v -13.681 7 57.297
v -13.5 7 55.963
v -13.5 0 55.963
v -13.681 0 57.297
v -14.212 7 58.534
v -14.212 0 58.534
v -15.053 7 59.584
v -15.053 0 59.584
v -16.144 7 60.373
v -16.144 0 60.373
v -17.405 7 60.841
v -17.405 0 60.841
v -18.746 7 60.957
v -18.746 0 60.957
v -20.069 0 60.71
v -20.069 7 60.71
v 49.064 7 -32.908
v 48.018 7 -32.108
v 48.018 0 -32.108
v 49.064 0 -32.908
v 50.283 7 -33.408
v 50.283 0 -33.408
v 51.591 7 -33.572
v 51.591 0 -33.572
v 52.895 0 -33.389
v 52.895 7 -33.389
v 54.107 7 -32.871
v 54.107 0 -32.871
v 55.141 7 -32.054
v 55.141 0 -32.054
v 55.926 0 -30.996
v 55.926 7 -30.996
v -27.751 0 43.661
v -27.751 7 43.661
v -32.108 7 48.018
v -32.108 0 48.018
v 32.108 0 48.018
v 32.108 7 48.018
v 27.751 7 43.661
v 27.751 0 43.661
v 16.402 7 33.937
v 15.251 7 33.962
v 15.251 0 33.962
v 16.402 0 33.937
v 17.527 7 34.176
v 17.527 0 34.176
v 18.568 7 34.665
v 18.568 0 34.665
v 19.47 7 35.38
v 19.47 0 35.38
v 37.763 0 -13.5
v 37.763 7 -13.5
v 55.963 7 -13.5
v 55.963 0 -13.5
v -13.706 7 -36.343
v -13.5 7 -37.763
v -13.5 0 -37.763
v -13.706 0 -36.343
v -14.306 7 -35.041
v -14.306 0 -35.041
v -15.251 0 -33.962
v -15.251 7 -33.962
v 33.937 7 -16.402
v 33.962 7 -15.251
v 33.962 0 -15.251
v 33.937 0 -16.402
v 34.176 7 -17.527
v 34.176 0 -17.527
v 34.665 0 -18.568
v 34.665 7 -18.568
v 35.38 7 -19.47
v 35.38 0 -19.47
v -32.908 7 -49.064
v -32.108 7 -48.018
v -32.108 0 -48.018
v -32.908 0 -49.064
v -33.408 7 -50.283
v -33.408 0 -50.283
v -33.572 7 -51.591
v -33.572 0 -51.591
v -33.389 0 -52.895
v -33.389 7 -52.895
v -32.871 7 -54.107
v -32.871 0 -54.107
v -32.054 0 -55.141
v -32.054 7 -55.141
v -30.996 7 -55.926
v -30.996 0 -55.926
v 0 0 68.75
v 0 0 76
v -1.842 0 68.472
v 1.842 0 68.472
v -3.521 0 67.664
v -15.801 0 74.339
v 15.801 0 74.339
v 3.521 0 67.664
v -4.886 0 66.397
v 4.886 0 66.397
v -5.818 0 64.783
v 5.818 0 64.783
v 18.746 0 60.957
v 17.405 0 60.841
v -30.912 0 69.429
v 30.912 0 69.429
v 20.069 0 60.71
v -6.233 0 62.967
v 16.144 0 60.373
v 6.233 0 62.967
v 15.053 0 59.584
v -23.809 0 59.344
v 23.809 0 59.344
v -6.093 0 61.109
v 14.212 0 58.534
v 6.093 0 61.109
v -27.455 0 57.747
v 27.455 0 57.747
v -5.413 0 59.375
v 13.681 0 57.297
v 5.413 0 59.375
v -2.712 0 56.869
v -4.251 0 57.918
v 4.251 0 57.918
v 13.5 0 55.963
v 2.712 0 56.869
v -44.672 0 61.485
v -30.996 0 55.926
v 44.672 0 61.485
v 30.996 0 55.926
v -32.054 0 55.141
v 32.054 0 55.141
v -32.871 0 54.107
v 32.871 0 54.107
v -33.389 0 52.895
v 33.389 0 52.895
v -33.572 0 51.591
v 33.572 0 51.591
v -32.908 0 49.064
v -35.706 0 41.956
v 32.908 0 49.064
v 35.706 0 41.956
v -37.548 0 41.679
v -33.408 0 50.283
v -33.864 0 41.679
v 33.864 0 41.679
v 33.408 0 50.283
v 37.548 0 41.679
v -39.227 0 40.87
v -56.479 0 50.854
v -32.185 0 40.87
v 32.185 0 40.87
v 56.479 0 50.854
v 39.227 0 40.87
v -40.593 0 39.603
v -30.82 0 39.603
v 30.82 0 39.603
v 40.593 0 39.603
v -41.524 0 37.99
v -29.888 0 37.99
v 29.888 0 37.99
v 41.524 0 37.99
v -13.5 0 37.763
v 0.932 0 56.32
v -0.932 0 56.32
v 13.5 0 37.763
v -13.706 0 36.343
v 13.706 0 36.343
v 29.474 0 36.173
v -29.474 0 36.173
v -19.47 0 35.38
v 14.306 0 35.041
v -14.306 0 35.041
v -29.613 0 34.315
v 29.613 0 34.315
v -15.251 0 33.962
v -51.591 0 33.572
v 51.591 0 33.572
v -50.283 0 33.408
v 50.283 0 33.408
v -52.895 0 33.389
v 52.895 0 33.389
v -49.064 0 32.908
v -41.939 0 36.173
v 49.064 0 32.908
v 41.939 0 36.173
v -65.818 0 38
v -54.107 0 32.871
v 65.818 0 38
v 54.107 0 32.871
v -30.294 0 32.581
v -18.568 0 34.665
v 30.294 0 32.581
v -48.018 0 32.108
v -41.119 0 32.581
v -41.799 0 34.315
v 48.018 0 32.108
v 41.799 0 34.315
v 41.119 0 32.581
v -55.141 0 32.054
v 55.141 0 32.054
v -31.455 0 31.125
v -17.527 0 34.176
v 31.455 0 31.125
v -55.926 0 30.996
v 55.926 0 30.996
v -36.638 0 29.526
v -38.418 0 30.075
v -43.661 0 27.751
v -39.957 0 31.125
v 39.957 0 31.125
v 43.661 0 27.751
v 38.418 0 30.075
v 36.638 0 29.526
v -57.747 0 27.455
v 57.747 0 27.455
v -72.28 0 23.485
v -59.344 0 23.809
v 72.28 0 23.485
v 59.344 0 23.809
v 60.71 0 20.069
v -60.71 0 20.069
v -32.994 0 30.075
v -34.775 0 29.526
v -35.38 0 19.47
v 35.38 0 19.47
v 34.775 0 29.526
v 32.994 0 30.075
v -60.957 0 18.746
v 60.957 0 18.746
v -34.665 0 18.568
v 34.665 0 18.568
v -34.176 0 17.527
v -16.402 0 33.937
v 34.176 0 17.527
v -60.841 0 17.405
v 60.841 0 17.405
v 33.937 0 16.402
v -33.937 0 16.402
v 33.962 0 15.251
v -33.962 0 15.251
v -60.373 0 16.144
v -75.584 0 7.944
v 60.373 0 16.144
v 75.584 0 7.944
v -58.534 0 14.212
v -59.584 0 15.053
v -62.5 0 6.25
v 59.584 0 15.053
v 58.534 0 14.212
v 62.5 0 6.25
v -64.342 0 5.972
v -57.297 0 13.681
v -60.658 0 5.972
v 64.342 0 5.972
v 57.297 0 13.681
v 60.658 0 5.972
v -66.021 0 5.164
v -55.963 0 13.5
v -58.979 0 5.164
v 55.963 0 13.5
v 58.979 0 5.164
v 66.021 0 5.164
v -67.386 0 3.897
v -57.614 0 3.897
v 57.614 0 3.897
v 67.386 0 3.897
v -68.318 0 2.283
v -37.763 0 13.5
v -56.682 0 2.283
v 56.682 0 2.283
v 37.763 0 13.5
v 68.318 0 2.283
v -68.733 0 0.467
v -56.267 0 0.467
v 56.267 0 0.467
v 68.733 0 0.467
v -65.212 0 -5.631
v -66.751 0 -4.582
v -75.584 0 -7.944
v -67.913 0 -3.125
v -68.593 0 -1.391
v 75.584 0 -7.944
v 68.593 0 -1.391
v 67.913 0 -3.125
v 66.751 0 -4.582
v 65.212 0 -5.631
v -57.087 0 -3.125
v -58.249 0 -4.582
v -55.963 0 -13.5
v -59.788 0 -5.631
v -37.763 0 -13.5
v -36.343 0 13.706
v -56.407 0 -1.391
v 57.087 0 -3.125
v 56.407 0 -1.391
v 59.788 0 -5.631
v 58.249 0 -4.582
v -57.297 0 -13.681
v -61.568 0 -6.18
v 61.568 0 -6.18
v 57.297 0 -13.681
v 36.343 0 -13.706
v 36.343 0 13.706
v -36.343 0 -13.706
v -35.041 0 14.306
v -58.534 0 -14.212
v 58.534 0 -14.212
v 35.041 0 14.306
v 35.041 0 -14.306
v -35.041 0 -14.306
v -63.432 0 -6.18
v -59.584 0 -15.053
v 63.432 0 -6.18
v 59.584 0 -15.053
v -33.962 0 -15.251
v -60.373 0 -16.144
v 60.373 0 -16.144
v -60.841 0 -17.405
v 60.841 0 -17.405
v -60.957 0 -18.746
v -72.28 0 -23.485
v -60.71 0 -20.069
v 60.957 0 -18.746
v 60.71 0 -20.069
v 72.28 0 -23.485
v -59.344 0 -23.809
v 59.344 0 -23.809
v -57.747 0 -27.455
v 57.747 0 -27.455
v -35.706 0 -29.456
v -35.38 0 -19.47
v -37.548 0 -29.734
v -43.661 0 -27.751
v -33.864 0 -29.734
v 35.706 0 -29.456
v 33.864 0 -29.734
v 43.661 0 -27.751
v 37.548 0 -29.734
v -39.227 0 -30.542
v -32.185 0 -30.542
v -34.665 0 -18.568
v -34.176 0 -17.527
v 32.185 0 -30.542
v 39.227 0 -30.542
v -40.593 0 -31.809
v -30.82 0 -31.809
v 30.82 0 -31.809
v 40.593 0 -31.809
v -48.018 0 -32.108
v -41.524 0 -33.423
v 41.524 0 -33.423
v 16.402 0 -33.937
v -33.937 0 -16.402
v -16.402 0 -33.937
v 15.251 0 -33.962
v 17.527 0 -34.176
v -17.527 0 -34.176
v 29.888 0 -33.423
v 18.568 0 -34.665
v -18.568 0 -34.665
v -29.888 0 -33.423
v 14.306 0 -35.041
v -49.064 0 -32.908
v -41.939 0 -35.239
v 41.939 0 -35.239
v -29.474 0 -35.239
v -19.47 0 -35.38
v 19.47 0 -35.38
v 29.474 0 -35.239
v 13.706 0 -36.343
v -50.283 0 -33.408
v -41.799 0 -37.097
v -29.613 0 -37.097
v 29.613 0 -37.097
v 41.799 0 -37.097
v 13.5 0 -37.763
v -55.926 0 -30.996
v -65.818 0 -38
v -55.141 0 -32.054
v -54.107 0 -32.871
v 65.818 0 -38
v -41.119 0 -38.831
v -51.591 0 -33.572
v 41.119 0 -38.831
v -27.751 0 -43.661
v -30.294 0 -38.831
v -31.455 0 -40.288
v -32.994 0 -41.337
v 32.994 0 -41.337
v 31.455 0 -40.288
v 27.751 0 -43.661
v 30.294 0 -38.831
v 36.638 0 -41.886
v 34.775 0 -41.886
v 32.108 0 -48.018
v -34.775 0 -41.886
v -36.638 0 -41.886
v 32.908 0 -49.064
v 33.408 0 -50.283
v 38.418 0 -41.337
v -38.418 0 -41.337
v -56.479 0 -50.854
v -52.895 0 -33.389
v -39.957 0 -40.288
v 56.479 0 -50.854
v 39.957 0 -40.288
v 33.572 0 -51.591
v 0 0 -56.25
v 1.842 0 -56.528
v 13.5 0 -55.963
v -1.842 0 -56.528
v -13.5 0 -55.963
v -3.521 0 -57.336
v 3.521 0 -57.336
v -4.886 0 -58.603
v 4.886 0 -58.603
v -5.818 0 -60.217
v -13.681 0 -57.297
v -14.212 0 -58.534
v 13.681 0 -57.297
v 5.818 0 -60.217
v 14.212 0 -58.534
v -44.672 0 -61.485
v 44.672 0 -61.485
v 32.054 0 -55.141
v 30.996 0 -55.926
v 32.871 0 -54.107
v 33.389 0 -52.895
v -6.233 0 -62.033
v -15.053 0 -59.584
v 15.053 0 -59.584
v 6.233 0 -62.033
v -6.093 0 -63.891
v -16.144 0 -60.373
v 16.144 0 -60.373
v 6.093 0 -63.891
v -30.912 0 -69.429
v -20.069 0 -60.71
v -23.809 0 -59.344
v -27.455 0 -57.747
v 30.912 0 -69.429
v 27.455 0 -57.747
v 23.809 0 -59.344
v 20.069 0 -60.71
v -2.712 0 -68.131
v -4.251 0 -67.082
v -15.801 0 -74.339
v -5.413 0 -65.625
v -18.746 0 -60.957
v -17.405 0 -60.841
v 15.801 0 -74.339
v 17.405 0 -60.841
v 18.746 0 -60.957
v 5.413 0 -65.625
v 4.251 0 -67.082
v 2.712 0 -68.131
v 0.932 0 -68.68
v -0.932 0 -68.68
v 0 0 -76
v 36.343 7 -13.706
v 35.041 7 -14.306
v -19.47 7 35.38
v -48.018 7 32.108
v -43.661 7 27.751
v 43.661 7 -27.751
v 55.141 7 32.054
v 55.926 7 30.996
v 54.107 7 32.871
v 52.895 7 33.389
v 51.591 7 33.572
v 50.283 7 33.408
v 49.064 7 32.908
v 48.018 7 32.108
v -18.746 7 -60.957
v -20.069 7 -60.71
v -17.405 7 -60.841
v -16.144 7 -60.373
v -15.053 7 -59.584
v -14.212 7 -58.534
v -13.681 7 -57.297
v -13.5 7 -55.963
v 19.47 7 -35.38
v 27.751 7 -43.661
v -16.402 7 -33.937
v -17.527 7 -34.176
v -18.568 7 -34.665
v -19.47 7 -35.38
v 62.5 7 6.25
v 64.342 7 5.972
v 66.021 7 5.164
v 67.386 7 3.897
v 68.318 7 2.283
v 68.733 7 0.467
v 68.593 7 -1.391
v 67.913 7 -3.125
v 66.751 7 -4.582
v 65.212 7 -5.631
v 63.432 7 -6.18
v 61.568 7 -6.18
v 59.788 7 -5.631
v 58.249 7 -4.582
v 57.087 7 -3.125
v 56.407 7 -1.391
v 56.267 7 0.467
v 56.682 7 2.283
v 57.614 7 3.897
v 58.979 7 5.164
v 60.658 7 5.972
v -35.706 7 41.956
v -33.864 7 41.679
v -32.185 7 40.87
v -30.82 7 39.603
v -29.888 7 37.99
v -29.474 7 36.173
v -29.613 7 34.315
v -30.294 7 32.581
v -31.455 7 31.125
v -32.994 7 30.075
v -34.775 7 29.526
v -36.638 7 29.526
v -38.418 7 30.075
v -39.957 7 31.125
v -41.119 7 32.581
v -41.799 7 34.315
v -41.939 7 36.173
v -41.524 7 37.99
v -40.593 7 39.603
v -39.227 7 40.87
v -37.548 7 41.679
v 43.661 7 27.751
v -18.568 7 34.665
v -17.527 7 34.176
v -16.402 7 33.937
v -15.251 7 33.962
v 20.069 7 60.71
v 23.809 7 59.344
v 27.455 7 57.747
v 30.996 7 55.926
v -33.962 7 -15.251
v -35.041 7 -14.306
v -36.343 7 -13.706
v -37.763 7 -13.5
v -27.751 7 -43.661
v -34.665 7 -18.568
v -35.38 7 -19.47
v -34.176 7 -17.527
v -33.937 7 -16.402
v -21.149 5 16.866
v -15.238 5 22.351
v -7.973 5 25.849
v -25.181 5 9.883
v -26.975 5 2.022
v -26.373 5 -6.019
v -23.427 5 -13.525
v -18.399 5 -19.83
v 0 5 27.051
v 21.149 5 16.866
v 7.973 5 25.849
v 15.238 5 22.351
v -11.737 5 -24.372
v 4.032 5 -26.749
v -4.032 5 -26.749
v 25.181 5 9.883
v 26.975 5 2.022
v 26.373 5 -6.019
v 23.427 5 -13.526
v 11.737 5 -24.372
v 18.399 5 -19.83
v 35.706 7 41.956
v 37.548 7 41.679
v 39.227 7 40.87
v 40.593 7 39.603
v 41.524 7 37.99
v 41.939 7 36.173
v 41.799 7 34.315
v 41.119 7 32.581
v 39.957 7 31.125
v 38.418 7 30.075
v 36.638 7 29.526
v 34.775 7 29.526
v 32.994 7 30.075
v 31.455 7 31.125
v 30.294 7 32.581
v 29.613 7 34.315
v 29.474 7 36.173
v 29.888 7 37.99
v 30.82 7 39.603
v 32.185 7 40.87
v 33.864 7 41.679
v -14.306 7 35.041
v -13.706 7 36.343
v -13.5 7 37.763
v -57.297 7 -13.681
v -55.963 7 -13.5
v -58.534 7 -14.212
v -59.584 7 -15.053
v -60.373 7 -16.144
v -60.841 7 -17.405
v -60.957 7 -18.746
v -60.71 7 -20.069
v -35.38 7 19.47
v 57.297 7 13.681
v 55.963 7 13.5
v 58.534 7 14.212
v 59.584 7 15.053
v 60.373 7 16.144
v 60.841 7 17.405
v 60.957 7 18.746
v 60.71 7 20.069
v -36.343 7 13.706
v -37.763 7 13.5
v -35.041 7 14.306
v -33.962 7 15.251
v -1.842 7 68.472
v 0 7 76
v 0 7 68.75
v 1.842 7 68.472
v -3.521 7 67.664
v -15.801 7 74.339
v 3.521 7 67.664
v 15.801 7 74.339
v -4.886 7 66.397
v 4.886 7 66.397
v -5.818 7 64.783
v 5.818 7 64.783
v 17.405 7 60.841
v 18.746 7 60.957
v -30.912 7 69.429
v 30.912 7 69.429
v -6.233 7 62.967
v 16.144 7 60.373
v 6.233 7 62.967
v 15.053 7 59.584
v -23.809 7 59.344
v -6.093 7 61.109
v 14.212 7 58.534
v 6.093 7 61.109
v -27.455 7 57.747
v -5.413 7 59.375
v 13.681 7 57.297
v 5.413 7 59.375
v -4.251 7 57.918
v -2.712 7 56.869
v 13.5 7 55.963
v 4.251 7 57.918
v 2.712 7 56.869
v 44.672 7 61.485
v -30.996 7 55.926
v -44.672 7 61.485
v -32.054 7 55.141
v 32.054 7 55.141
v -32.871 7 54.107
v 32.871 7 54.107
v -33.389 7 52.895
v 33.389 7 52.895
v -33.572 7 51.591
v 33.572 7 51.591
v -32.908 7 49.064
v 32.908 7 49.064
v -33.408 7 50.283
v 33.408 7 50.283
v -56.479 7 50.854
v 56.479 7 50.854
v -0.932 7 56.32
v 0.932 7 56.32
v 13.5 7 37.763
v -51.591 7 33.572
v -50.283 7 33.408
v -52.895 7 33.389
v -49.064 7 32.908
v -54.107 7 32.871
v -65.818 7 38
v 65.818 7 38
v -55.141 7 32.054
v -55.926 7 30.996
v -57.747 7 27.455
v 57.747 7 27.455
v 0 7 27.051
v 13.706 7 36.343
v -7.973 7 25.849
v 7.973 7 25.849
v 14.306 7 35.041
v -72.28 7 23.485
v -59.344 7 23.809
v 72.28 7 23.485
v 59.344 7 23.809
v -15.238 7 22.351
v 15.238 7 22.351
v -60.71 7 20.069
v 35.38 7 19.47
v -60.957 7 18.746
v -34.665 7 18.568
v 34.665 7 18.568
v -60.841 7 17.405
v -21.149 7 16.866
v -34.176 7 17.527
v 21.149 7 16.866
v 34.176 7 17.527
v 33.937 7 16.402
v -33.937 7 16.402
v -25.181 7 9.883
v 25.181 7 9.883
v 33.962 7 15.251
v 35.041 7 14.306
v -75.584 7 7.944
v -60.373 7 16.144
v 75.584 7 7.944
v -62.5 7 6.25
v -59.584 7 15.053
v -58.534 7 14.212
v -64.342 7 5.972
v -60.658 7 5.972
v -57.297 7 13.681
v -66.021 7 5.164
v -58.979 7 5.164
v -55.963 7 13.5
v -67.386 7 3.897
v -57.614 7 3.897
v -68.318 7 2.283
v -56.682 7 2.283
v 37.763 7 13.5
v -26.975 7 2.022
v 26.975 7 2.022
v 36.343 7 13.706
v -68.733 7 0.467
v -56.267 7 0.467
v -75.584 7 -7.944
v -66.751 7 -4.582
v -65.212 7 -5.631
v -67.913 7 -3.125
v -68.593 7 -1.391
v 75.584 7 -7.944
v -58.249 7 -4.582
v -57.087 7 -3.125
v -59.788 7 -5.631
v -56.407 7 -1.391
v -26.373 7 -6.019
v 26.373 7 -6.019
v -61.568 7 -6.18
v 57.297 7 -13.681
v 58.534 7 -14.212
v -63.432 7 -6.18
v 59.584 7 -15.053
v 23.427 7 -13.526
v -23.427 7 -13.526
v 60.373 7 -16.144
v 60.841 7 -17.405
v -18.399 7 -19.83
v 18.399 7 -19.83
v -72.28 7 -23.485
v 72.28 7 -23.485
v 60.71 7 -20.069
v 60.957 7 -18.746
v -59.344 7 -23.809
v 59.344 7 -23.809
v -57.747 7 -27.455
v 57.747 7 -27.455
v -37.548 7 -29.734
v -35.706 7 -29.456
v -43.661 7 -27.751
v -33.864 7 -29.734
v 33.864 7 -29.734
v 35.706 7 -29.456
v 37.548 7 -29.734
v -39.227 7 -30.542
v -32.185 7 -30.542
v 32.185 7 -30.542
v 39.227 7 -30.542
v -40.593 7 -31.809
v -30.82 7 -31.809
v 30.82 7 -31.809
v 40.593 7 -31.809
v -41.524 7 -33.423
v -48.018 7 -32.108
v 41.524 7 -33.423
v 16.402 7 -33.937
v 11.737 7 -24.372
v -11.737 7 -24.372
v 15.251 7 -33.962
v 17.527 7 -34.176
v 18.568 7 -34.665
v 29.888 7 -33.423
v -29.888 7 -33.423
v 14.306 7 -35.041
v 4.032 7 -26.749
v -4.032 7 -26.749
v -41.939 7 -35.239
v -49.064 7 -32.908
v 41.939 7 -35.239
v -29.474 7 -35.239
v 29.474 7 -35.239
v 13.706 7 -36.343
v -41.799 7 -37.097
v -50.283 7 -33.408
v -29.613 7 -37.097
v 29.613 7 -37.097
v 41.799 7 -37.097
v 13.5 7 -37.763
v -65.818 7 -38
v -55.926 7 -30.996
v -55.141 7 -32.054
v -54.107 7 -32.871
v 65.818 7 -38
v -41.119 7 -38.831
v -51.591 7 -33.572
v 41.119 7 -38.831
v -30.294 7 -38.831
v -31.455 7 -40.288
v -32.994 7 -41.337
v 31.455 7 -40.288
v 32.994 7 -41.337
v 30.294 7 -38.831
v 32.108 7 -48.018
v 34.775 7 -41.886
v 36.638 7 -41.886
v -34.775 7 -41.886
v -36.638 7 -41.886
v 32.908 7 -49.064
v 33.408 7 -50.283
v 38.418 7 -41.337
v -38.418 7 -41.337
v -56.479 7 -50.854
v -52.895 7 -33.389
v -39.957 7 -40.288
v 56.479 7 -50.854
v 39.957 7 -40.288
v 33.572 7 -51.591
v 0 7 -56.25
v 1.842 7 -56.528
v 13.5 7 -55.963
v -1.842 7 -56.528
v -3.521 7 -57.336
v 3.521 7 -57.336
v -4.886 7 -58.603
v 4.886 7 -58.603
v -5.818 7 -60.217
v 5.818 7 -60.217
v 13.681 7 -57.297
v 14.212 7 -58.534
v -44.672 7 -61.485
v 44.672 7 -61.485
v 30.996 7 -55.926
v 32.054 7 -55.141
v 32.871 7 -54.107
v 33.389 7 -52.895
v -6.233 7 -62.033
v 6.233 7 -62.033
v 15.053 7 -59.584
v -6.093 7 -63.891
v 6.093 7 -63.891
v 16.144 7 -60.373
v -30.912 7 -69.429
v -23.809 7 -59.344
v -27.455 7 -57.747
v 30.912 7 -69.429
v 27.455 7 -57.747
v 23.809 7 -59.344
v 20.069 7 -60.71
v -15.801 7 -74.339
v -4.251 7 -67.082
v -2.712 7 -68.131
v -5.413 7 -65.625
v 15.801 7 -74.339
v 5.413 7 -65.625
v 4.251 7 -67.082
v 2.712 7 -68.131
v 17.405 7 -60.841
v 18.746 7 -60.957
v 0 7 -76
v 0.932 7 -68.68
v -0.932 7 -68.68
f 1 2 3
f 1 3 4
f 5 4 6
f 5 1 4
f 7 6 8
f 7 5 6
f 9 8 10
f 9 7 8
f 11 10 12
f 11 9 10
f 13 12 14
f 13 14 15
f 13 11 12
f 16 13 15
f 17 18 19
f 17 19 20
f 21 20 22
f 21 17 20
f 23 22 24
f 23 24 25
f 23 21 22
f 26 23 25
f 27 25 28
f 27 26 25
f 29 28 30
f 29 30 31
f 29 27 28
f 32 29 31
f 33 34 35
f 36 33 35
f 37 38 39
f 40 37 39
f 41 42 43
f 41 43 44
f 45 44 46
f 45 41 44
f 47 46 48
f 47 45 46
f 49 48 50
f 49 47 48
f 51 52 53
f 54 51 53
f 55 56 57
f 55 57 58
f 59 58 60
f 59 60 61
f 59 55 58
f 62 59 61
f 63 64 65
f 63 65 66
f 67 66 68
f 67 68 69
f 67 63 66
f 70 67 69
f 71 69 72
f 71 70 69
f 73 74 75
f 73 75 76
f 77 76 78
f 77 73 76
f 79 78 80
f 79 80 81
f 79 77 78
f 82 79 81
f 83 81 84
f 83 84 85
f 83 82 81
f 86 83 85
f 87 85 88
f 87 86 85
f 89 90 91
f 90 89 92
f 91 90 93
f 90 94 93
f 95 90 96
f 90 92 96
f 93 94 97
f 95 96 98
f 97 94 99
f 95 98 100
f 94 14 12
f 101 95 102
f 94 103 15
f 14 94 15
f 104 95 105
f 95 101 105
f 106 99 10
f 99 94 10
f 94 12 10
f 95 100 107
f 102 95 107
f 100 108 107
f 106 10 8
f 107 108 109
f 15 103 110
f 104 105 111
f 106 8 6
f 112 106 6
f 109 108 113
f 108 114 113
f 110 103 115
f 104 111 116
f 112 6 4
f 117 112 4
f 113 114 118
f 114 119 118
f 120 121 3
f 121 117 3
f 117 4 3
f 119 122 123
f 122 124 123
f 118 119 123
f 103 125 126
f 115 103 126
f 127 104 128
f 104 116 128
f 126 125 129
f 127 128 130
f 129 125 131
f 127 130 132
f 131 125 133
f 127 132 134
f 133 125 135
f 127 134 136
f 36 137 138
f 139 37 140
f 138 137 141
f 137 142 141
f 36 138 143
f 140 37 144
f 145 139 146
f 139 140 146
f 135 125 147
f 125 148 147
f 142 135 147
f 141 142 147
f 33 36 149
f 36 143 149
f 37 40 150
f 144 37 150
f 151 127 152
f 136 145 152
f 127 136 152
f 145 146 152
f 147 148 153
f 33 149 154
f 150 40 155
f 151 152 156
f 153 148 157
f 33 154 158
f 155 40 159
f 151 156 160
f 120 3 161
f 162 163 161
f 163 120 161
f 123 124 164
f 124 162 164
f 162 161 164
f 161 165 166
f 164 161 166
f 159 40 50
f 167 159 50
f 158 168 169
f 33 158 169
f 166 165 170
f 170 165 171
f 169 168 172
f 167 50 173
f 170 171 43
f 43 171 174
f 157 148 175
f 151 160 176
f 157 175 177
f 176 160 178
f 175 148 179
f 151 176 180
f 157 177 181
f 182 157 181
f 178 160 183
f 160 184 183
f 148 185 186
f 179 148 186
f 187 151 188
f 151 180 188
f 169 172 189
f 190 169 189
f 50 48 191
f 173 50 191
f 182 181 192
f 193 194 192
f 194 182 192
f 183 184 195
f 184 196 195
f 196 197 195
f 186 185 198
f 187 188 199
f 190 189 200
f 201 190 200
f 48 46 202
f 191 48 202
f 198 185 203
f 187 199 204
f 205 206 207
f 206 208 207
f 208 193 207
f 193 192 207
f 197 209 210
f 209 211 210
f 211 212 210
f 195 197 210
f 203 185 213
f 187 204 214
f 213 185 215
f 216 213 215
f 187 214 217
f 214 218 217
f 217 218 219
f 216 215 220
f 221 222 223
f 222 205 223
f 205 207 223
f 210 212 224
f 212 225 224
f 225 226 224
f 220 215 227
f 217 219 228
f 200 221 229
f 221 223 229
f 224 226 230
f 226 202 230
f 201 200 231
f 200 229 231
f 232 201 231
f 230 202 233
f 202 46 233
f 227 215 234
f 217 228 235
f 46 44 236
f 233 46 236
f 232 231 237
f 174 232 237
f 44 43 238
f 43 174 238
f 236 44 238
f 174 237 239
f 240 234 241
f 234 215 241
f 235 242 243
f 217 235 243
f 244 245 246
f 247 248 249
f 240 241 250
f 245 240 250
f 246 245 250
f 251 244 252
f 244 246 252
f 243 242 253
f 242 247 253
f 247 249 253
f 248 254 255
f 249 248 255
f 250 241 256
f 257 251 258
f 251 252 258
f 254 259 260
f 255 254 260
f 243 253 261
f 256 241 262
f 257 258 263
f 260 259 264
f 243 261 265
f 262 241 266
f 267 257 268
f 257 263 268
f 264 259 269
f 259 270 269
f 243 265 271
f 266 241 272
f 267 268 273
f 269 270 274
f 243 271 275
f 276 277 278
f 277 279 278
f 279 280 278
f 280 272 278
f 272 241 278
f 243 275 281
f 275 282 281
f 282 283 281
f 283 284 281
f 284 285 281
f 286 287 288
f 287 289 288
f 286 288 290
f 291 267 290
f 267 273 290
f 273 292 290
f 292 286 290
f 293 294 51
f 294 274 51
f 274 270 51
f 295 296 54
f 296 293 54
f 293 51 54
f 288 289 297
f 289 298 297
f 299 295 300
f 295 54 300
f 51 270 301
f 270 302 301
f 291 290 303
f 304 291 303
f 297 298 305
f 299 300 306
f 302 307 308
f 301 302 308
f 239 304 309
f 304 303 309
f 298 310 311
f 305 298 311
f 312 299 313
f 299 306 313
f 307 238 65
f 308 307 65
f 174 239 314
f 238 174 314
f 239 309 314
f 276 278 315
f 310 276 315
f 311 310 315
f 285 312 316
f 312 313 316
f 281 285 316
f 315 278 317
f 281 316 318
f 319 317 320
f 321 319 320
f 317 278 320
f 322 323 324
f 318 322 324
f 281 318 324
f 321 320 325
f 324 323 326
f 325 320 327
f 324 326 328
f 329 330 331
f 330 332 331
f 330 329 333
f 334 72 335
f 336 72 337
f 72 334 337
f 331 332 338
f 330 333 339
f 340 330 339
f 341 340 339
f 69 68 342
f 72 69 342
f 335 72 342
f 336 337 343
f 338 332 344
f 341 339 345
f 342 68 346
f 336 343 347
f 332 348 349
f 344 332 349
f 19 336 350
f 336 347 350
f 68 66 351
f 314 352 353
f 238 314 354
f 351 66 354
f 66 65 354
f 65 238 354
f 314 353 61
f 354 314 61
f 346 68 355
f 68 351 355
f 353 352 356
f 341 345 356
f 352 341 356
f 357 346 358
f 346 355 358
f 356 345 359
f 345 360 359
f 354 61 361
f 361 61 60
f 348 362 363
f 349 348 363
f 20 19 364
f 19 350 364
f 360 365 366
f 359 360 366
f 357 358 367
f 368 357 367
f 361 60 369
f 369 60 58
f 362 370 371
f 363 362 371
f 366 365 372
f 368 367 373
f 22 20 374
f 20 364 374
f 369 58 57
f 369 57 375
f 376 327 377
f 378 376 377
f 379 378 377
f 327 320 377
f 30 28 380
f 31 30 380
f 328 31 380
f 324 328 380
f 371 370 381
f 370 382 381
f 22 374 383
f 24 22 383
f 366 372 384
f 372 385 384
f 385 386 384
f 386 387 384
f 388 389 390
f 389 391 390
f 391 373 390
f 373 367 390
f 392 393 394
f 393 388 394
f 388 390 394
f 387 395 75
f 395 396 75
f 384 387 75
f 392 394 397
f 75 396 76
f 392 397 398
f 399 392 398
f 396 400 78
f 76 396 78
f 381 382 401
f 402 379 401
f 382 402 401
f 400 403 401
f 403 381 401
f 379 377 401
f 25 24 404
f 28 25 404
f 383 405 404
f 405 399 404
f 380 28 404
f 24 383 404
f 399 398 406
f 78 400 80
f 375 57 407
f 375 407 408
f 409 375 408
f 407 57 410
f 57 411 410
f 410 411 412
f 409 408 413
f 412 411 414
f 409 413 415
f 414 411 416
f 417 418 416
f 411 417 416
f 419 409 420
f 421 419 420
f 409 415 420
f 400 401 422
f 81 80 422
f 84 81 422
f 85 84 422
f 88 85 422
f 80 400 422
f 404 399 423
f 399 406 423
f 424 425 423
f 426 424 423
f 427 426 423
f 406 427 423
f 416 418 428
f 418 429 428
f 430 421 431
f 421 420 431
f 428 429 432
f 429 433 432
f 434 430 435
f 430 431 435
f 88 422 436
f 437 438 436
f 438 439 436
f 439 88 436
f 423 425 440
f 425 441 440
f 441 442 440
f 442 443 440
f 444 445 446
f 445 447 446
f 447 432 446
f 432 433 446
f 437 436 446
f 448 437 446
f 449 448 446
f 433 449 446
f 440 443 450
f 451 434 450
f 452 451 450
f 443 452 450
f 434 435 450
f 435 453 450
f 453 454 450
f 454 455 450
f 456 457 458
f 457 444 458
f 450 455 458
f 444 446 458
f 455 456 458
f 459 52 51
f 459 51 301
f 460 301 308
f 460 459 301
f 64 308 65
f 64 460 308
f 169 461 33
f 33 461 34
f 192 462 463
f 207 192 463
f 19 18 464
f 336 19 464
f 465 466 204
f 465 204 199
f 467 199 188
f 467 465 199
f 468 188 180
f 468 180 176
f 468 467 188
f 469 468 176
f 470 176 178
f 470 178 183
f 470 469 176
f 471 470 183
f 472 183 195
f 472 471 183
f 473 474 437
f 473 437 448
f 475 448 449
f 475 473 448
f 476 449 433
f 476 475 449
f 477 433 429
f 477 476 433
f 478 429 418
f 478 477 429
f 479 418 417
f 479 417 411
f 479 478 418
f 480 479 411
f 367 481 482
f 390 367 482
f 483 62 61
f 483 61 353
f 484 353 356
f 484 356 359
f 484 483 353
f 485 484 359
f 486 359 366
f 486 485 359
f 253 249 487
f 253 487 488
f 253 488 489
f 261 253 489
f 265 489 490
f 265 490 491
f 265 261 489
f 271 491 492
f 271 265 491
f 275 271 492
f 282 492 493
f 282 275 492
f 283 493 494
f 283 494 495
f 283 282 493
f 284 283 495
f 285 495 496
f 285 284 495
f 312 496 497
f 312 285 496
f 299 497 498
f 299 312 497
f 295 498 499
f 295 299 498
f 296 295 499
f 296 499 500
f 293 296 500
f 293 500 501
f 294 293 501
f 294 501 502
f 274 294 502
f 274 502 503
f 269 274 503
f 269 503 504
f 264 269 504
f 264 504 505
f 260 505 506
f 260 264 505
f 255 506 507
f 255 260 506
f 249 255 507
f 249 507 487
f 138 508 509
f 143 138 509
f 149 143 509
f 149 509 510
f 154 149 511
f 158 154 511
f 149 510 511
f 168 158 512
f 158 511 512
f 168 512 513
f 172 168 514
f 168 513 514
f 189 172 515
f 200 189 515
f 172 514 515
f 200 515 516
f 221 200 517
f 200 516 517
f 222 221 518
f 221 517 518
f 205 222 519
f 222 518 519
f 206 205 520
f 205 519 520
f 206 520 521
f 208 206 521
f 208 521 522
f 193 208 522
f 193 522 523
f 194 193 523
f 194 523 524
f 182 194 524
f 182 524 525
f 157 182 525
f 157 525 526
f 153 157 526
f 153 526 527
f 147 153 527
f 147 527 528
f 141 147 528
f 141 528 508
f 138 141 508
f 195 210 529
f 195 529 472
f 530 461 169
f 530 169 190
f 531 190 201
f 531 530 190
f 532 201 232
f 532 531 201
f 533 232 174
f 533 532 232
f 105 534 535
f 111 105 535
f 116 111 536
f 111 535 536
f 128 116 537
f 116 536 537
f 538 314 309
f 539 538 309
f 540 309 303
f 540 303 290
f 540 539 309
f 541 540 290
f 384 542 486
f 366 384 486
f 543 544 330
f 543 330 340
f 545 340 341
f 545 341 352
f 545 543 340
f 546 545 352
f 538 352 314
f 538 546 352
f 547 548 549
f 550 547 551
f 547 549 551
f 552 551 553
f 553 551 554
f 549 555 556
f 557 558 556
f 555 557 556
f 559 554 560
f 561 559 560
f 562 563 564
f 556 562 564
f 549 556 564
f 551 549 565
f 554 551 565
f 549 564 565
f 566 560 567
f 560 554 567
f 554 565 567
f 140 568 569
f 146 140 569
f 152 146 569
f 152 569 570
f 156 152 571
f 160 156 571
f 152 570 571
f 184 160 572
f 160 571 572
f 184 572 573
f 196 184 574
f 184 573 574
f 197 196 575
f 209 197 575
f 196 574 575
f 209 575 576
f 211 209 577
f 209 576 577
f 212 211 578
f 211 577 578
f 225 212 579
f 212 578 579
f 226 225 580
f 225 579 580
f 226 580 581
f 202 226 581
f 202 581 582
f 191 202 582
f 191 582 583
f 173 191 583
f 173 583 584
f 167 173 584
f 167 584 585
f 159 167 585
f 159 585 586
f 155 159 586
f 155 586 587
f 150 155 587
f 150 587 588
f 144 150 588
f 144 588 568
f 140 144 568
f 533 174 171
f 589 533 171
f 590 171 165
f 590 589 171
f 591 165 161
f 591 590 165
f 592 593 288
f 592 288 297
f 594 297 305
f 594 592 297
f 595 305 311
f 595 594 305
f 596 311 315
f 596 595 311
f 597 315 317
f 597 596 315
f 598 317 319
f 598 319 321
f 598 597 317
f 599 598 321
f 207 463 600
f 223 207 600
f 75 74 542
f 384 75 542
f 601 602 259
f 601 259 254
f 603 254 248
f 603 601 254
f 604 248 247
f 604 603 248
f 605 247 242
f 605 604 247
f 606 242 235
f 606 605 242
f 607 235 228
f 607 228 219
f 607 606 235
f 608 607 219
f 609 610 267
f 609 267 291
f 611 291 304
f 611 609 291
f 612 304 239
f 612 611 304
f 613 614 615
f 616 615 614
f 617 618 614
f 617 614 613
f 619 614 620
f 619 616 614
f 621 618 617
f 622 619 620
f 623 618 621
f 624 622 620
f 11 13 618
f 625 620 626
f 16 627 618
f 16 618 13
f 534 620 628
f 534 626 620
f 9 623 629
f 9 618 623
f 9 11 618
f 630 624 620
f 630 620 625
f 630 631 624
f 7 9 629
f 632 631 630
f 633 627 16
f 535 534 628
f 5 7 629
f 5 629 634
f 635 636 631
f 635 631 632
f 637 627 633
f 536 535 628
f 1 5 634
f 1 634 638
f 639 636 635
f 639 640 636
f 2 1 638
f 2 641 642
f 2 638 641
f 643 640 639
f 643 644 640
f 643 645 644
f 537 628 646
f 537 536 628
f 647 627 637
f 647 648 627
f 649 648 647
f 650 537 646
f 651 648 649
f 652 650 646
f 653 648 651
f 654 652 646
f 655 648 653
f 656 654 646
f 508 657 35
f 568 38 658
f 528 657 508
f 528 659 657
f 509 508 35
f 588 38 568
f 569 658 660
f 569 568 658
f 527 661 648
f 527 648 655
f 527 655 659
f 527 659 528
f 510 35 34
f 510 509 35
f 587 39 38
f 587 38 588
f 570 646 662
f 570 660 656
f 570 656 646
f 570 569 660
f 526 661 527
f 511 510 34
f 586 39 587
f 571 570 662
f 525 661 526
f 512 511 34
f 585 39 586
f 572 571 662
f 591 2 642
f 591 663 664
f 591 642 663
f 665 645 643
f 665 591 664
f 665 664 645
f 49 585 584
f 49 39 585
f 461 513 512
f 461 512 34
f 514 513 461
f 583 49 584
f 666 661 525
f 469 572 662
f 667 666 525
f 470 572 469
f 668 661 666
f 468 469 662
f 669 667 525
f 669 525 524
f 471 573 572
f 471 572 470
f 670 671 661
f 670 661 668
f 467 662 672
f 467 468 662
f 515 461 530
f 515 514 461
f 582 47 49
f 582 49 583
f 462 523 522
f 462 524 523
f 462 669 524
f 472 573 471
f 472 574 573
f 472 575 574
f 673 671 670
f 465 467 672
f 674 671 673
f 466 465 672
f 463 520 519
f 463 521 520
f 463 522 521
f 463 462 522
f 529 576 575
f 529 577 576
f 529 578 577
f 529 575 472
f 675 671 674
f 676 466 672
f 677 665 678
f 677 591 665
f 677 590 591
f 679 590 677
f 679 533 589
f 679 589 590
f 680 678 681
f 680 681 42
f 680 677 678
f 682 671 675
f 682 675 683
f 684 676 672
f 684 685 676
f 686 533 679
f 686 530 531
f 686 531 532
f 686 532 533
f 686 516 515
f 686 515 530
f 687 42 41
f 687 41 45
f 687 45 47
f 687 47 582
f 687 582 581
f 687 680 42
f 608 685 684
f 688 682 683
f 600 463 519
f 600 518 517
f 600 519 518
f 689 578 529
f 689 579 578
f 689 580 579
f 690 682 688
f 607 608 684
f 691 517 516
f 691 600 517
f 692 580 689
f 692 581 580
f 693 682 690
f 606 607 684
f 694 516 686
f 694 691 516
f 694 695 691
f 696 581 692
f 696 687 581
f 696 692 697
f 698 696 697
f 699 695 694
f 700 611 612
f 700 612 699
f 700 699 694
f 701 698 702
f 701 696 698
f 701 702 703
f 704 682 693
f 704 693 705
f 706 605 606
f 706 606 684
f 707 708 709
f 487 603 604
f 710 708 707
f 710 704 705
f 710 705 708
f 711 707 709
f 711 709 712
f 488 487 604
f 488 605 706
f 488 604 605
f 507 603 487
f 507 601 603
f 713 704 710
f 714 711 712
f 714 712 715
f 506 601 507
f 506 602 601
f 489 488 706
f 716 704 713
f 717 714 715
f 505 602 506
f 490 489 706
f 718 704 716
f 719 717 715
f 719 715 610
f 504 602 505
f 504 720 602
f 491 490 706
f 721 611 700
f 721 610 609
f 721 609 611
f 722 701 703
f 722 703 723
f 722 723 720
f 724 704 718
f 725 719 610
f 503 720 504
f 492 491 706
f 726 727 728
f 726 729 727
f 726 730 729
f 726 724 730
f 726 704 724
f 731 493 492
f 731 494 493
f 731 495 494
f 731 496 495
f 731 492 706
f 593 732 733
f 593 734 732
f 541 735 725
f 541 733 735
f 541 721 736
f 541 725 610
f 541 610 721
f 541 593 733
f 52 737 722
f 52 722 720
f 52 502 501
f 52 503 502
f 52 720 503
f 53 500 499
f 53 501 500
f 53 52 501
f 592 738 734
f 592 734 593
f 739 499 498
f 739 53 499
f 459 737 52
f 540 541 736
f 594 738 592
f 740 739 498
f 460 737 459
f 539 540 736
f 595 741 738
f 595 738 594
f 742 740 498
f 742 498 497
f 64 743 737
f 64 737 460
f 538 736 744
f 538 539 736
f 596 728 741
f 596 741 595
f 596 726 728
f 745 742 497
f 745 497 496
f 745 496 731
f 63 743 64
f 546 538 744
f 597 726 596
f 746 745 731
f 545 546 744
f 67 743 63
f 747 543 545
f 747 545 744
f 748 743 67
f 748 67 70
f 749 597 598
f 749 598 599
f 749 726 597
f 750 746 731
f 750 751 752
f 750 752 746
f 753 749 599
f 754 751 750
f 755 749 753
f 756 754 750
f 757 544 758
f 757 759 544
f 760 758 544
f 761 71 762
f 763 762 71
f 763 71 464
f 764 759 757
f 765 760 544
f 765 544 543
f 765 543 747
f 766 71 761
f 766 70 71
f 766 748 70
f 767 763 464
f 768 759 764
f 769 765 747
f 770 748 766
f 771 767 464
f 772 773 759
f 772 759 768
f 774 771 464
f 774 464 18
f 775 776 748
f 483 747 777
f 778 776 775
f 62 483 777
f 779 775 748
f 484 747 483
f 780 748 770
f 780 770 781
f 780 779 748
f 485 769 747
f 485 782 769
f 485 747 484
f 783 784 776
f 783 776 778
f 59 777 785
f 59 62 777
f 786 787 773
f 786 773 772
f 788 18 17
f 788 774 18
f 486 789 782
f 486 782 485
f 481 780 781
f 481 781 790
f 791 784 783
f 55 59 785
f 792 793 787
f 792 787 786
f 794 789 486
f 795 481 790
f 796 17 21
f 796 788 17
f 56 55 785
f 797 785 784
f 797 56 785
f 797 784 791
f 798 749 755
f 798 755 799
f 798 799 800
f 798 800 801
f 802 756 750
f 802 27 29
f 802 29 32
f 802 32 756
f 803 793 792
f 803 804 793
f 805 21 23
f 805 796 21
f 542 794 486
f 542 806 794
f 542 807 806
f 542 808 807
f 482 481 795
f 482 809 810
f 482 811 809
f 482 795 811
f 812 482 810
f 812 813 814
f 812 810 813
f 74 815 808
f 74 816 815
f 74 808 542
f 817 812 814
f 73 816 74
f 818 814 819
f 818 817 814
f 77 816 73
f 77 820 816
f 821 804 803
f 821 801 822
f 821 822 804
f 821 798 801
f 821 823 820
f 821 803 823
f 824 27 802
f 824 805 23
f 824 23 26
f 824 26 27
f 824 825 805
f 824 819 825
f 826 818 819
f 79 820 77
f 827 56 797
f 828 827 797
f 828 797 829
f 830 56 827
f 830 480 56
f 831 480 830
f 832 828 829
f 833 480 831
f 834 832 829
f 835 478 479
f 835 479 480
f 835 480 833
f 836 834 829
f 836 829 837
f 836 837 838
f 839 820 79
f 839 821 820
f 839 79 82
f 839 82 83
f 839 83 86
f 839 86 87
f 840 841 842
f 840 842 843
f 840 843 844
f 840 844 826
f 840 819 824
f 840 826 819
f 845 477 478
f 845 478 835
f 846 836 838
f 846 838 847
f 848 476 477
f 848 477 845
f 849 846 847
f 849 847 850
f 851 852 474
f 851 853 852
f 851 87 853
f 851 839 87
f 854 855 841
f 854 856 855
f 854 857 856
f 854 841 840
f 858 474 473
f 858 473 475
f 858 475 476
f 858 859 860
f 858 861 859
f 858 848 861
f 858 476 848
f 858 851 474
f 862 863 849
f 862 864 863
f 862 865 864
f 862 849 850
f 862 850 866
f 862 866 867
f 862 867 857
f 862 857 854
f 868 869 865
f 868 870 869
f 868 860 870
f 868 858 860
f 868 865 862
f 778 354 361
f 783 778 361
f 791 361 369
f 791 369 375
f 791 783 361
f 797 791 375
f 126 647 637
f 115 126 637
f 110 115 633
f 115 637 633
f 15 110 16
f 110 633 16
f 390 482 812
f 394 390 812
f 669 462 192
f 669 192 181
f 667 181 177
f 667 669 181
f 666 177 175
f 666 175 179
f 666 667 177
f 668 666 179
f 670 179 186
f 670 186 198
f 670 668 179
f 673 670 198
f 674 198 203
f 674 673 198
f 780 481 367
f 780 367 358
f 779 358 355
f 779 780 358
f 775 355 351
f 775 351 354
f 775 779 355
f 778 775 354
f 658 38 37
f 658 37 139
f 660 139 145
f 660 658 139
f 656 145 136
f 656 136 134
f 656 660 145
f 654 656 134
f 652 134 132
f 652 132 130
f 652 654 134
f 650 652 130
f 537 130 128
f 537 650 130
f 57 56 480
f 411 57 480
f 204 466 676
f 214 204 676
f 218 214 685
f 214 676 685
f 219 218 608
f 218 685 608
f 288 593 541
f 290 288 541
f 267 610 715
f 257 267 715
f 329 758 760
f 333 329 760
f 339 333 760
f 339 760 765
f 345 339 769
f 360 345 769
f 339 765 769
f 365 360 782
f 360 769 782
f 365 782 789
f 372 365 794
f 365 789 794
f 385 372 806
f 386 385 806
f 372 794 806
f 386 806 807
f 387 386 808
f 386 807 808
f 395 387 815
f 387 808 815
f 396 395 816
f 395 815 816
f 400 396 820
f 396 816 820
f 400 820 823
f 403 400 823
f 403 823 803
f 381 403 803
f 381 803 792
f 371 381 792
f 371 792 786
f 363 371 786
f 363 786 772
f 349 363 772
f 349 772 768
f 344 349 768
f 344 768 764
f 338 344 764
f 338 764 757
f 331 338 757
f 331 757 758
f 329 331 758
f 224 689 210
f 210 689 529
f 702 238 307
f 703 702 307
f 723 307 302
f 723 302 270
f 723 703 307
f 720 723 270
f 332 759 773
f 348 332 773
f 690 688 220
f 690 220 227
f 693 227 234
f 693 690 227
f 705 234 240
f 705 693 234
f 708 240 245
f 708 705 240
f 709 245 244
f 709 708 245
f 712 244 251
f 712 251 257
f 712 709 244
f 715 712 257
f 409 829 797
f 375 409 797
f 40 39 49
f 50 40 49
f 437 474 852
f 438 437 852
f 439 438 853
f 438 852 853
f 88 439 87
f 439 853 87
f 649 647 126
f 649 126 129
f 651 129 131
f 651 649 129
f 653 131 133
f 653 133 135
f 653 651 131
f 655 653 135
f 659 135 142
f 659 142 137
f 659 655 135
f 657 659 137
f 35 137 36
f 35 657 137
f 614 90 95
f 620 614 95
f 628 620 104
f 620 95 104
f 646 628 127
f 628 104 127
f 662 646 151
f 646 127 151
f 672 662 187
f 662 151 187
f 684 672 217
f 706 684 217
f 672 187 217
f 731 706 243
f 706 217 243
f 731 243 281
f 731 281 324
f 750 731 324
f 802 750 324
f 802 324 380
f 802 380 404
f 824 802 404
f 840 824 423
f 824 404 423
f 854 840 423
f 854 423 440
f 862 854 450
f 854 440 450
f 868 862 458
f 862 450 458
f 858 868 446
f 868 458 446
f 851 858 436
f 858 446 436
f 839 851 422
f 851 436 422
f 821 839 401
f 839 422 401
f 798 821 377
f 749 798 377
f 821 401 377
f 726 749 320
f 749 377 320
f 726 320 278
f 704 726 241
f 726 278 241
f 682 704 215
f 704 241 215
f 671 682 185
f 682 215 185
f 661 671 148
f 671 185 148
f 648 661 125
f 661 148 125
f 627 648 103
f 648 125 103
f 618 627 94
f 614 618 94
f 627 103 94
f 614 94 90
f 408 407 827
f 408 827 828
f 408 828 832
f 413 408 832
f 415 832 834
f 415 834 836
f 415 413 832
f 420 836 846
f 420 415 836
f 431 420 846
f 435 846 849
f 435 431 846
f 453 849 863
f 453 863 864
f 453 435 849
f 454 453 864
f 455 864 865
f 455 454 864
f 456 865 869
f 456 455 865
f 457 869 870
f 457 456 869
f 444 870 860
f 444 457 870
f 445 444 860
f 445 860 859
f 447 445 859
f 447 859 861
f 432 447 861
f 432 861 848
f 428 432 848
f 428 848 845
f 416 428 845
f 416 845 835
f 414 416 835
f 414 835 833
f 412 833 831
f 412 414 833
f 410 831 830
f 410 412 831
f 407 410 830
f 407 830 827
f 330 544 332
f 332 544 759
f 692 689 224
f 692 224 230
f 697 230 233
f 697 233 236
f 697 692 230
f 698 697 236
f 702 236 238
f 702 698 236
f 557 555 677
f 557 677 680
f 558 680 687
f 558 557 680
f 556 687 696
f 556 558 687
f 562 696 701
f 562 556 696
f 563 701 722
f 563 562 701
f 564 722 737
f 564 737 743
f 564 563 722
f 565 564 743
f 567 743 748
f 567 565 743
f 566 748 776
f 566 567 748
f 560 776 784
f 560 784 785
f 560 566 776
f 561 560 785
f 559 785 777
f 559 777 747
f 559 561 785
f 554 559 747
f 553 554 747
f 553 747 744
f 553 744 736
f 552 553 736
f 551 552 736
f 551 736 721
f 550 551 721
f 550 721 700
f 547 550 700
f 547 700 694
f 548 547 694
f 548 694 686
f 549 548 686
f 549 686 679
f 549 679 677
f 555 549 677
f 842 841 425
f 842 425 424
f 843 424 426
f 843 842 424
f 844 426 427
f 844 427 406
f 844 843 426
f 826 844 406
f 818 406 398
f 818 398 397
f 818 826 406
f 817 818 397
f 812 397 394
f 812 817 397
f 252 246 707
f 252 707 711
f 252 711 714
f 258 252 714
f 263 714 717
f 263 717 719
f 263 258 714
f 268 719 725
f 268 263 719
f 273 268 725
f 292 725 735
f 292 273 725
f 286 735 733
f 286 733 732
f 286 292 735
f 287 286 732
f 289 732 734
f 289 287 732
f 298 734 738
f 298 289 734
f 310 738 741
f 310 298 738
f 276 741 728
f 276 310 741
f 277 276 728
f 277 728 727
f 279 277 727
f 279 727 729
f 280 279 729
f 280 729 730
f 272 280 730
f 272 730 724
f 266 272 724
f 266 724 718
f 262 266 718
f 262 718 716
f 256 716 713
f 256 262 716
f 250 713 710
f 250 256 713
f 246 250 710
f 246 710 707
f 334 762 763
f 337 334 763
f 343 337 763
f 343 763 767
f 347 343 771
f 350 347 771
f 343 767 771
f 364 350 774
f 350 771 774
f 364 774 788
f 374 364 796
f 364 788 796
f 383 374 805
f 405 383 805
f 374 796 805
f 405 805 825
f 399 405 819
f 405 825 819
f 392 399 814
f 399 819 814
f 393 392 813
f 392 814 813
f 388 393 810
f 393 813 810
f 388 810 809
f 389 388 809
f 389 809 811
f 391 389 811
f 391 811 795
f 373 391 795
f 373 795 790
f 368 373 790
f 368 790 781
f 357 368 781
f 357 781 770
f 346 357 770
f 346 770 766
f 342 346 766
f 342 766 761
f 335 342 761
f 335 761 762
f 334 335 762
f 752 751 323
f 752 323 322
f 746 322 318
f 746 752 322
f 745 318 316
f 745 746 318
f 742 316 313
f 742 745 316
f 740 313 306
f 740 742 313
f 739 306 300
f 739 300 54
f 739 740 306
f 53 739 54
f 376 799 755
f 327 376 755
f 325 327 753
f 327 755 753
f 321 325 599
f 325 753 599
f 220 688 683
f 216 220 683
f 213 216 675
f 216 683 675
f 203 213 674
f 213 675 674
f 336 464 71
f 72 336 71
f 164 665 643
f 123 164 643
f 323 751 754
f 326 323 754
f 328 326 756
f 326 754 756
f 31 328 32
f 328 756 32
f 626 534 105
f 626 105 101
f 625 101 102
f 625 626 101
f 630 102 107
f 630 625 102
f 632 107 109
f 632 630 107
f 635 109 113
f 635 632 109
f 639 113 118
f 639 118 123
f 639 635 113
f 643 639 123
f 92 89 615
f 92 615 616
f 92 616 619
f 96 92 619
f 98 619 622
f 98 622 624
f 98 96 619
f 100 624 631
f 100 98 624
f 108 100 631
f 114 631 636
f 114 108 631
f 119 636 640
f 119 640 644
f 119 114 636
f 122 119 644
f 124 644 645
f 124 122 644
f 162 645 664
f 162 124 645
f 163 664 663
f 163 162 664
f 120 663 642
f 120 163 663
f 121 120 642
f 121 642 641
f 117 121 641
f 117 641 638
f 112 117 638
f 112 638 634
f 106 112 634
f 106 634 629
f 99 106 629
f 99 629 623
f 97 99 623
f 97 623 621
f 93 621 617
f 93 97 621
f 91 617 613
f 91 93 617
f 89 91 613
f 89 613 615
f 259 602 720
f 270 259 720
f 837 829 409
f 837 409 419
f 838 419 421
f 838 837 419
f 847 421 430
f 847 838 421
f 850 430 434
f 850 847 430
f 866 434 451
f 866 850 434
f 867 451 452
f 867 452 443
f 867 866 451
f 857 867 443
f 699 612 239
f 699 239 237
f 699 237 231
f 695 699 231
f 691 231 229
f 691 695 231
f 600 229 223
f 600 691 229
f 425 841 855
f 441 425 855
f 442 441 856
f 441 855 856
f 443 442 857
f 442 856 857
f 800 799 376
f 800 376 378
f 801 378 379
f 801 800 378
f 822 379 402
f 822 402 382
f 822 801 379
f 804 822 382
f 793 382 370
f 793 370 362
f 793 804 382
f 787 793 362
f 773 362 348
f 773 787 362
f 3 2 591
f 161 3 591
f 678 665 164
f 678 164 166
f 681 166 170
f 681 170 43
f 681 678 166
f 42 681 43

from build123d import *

# Parameters (mm, degrees)
SKETCH1_R           = 76
SKETCH1_R_2         = 27.051
SKETCH1_R_3         = 6.25
BOSS_EXTRUDE1_DEPTH = 7
SKETCH3_R           = 27.051
BOSS_EXTRUDE2_DEPTH = 5
SKETCH4_R           = 6.25
CUT_EXTRUDE1_DEPTH  = 10
FILLET1_R           = 5


with BuildPart() as part:
    # Sketch1 → Boss-Extrude1 (new body)
    with BuildSketch(Plane(origin=(0, 0, 0), x_dir=(1, 0, 0), z_dir=(0, 1, 0))):
        with Locations(Location((0, 0, 0), (0, 0, 270))):
            Circle(SKETCH1_R)
        with Locations(Location((0, 0, 0), (0, 0, 270))):
            Circle(SKETCH1_R_2, mode=Mode.SUBTRACT)
        with Locations(Location((0, 62.5, 0), (0, 0, 270))):
            Circle(SKETCH1_R_3, mode=Mode.SUBTRACT)
        with Locations(Location((62.5, 0, 0), (0, 0, 270))):
            Circle(SKETCH1_R_3, mode=Mode.SUBTRACT)
        with Locations(Location((0, -62.5, 0), (0, 0, 270))):
            Circle(SKETCH1_R_3, mode=Mode.SUBTRACT)
        with Locations(Location((-62.5, 0, 0), (0, 0, 270))):
            Circle(SKETCH1_R_3, mode=Mode.SUBTRACT)
    extrude(amount=BOSS_EXTRUDE1_DEPTH)

    # Sketch3 → Boss-Extrude2 (add)
    with BuildSketch(Plane.XZ):
        with Locations(Location((0, 0, 0), (0, 0, 270))):
            Circle(SKETCH3_R)
    extrude(amount=-BOSS_EXTRUDE2_DEPTH)

    # Sketch4 → Cut-Extrude1 (cut)
    with BuildSketch(Plane(origin=(0, 7, 0), x_dir=(1, 0, 0), z_dir=(0, 1, 0))):
        with BuildLine():
            Line((27.751246841, -43.661149418), (17.007161012, -32.917063589))
            ThreePointArc((17.007161012, -32.917063589), (15.274204293, -33.756114768), (13.5, -34.504008477))
            Line((13.5, -34.504008477), (13.5, -62.5))
            ThreePointArc((13.5, -62.5), (25.524772494, -58.625813335), (36.553123822, -52.463026398))
            Line((36.553123822, -52.463026398), (27.751246841, -43.661149418))
        make_face()
        with BuildLine():
            Line((62.5, -13.5), (34.504008477, -13.5))
            ThreePointArc((34.504008477, -13.5), (33.756114768, -15.274204293), (32.917063589, -17.007161012))
            Line((32.917063589, -17.007161012), (43.66114941, -27.751246833))
            Line((43.66114941, -27.751246833), (52.463026398, -36.553123822))
            ThreePointArc((52.463026398, -36.553123822), (58.625813335, -25.524772494), (62.5, -13.5))
        make_face()
        with BuildLine():
            ThreePointArc((-13.5, -34.504008477), (-15.274204293, -33.756114768), (-17.007161012, -32.917063589))
            Line((-17.007161012, -32.917063589), (-27.751246874, -43.66114945))
            Line((-27.751246874, -43.66114945), (-36.553123822, -52.463026398))
            ThreePointArc((-36.553123822, -52.463026398), (-25.524772494, -58.625813335), (-13.5, -62.5))
            Line((-13.5, -62.5), (-13.5, -34.504008477))
        make_face()
        with BuildLine():
            ThreePointArc((-32.917063589, -17.007161012), (-33.756114768, -15.274204293), (-34.504008477, -13.5))
            Line((-34.504008477, -13.5), (-62.5, -13.5))
            ThreePointArc((-62.5, -13.5), (-58.625813335, -25.524772494), (-52.463026398, -36.553123822))
            Line((-52.463026398, -36.553123822), (-43.661149471, -27.751246894))
            Line((-43.661149471, -27.751246894), (-32.917063589, -17.007161012))
        make_face()
        with BuildLine():
            ThreePointArc((-34.504008477, 13.5), (-33.756114768, 15.274204293), (-32.917063589, 17.007161012))
            Line((-32.917063589, 17.007161012), (-43.66114943, 27.751246854))
            Line((-43.66114943, 27.751246854), (-52.463026398, 36.553123822))
            ThreePointArc((-52.463026398, 36.553123822), (-58.625813335, 25.524772494), (-62.5, 13.5))
            Line((-62.5, 13.5), (-34.504008477, 13.5))
        make_face()
        with BuildLine():
            ThreePointArc((-17.007161012, 32.917063589), (-15.274204293, 33.756114768), (-13.5, 34.504008477))
            Line((-13.5, 34.504008477), (-13.5, 62.5))
            ThreePointArc((-13.5, 62.5), (-25.524772494, 58.625813335), (-36.553123822, 52.463026398))
            Line((-36.553123822, 52.463026398), (-27.751246874, 43.66114945))
            Line((-27.751246874, 43.66114945), (-17.007161012, 32.917063589))
        make_face()
        with BuildLine():
            ThreePointArc((36.553123822, 52.463026398), (25.524772494, 58.625813335), (13.5, 62.5))
            Line((13.5, 62.5), (13.5, 34.504008477))
            ThreePointArc((13.5, 34.504008477), (15.274204293, 33.756114768), (17.007161012, 32.917063589))
            Line((17.007161012, 32.917063589), (27.751246906, 43.661149483))
            Line((27.751246906, 43.661149483), (36.553123822, 52.463026398))
        make_face()
        with BuildLine():
            ThreePointArc((62.5, 13.5), (58.625813335, 25.524772494), (52.463026398, 36.553123822))
            Line((52.463026398, 36.553123822), (43.66114945, 27.751246874))
            Line((43.66114945, 27.751246874), (32.917063589, 17.007161012))
            ThreePointArc((32.917063589, 17.007161012), (33.756114768, 15.274204293), (34.504008477, 13.5))
            Line((34.504008477, 13.5), (62.5, 13.5))
        make_face()
        with Locations(Location((35.706198162, 35.706198162, 0), (0, 0, 270))):
            Circle(SKETCH4_R)
        with Locations(Location((35.706198162, -35.706198162, 0), (0, 0, 270))):
            Circle(SKETCH4_R)
        with Locations(Location((-35.706198162, -35.706198162, 0), (0, 0, 270))):
            Circle(SKETCH4_R)
        with Locations(Location((-35.706198162, 35.706198162, 0), (0, 0, 270))):
            Circle(SKETCH4_R)
    extrude(amount=-CUT_EXTRUDE1_DEPTH, mode=Mode.SUBTRACT)

    # Fillet1
    # the kernel refuses this fillet: 5 mm, written as the material it adds along each edge
    with BuildSketch(Plane(origin=(34.504008477, 7, 13.5), x_dir=(1, 0, 0), z_dir=(0, -1, 0)), Plane(origin=(13.5, 7, -34.504008477), x_dir=(0, 0, -1), z_dir=(0, -1, 0)), Plane(origin=(-34.504008477, 7, -13.5), x_dir=(-1, 0, 0), z_dir=(0, -1, 0)), Plane(origin=(-13.5, 7, 34.504008477), x_dir=(0, 0, 1), z_dir=(0, -1, 0))) as fillet1_piece_1:
        with BuildLine():
            CenterArc((3.258891319, 5), FILLET1_R, 206.100178987, 63.899821013)
            ThreePointArc((-1.231239688, 2.800290124), (-0.586707725, 1.412857227), (0, 0))
            Line((0, 0), (3.258891319, 0))
        make_face()
    extrude(amount=7)
    with BuildSketch(Plane(origin=(62.5, 7, 13.5), x_dir=(-1, 0, 0), z_dir=(0, -1, 0))) as fillet1_piece_2:
        with BuildLine():
            CenterArc((6.537189081, -5), FILLET1_R, 90, 108.2926811)
            ThreePointArc((1.789861186, -6.569355874), (0.807426008, -3.308519097), (0, 0))
            Line((0, 0), (6.537189081, 0))
        make_face()
    extrude(amount=7)
    with BuildSketch(Plane(origin=(52.463026398, 7, 36.553123822), x_dir=(-0.7071067811865521, 0, -0.707106781186543), z_dir=(0, -1, 0)), Plane(origin=(-36.553123822, 7, 52.463026398), x_dir=(0.7071067811865515, 0, -0.7071067811865436), z_dir=(0, -1, 0))) as fillet1_piece_3:
        with BuildLine():
            CenterArc((6.286852353, 5), FILLET1_R, 163.996405934, 106.003594066)
            ThreePointArc((1.480630334, 6.378488268), (0.658610883, 3.208210045), (0, 0))
            Line((0, 0), (6.286852353, 0))
        make_face()
    extrude(amount=7)
    with BuildSketch(Plane(origin=(32.917063589, 7, 17.007161012), x_dir=(0.4193809358930841, 0, -0.907810349472532), z_dir=(0, -1, 0)), Plane(origin=(17.007161012, 7, -32.917063589), x_dir=(-0.9078103494725283, 0, -0.41938093589309267), z_dir=(0, -1, 0)), Plane(origin=(-32.917063589, 7, -17.007161012), x_dir=(-0.4193809358930852, 0, 0.9078103494725317), z_dir=(0, -1, 0))) as fillet1_piece_4:
        with BuildLine():
            CenterArc((3.489548398, 4.995132399), FILLET1_R, 200.204490443, 67.267112024)
            Line((-1.202781391, 3.268273647), (0, 0))
            ThreePointArc((0, 0), (1.634487847, 0.036069898), (3.268975694, 0))
        make_face()
    extrude(amount=7)
    with BuildSketch(Plane(origin=(32.917063589, 7, -17.007161012), x_dir=(0.7071067811865526, 0, -0.7071067811865425), z_dir=(0, -1, 0)), Plane(origin=(-17.007161012, 7, -32.917063589), x_dir=(-0.7071067811865506, 0, -0.7071067811865445), z_dir=(0, -1, 0)), Plane(origin=(-32.917063589, 7, 17.007161012), x_dir=(-0.7071067811865506, 0, 0.7071067811865445), z_dir=(0, -1, 0)), Plane(origin=(17.007161012, 7, 32.917063589), x_dir=(0.7071067811865501, 0, 0.707106781186545), z_dir=(0, -1, 0))) as fillet1_piece_5:
        with BuildLine():
            CenterArc((3.482570273, 5), FILLET1_R, 202.732887976, 67.267112024)
            ThreePointArc((-1.129011858, 3.067822406), (-0.530655558, 1.546368727), (0, 0))
            Line((0, 0), (3.482570273, 0))
        make_face()
    extrude(amount=7)
    with BuildSketch(Plane(origin=(34.504008477, 7, -13.5), x_dir=(1, 0, 0), z_dir=(0, -1, 0))) as fillet1_piece_6:
        with BuildLine():
            CenterArc((3.258891319, -5), FILLET1_R, 90, 63.899821013)
            ThreePointArc((-1.231239688, -2.800290124), (-0.586707725, -1.412857227), (0, 0))
            Line((0, 0), (3.258891319, 0))
        make_face()
    extrude(amount=7)
    with BuildSketch(Plane(origin=(62.5, 7, -13.5), x_dir=(-1, 0, 0), z_dir=(0, -1, 0)), Plane(origin=(-13.5, 7, -62.5), x_dir=(0, 0, 1), z_dir=(0, -1, 0)), Plane(origin=(-62.5, 7, 13.5), x_dir=(1, 0, 0), z_dir=(0, -1, 0)), Plane(origin=(13.5, 7, 62.5), x_dir=(0, 0, -1), z_dir=(0, -1, 0))) as fillet1_piece_7:
        with BuildLine():
            CenterArc((6.537189081, 5), FILLET1_R, 161.7073189, 108.2926811)
            ThreePointArc((1.789861186, 6.569355874), (0.807426008, 3.308519097), (0, 0))
            Line((0, 0), (6.537189081, 0))
        make_face()
    extrude(amount=7)
    with BuildSketch(Plane(origin=(52.463026398, 7, -36.553123822), x_dir=(0.5289042688396526, 0, 0.848681491728901), z_dir=(0, -1, 0))) as fillet1_piece_8:
        with BuildLine():
            CenterArc((6.292063112, 4.993441128), FILLET1_R, 166.931450544, 106.003594066)
            Line((1.421561948, 6.124024341), (0, 0))
            ThreePointArc((0, 0), (3.274041034, -0.08387667), (6.548082068, 0))
        make_face()
    extrude(amount=7)
    with BuildSketch(Plane(origin=(36.553123822, 7, -52.463026398), x_dir=(-0.8486814917288963, 0, -0.52890426883966), z_dir=(0, -1, 0)), Plane(origin=(-52.463026398, 7, -36.553123822), x_dir=(-0.5289042688396536, 0, 0.8486814917289003), z_dir=(0, -1, 0))) as fillet1_piece_9:
        with BuildLine():
            CenterArc((6.292063112, -4.993441128), FILLET1_R, 87.06495539, 106.003594066)
            Line((1.421561948, -6.124024341), (0, 0))
            ThreePointArc((0, 0), (3.274041034, 0.08387667), (6.548082068, 0))
        make_face()
    extrude(amount=7)
    with BuildSketch(Plane(origin=(13.5, 7, -62.5), x_dir=(0.9648302017860143, 0, 0.26287388938720957), z_dir=(0, -1, 0)), Plane(origin=(-62.5, 7, -13.5), x_dir=(0.2628738893872084, 0, -0.9648302017860146), z_dir=(0, -1, 0)), Plane(origin=(-13.5, 7, 62.5), x_dir=(-0.9648302017860145, 0, -0.26287388938720885), z_dir=(0, -1, 0))) as fillet1_piece_10:
        with BuildLine():
            CenterArc((6.542607328, 4.992908013), FILLET1_R, 164.759342849, 108.2926811)
            Line((1.718456319, 6.30727746), (0, 0))
            ThreePointArc((0, 0), (3.404410363, -0.090694285), (6.808820725, 0))
        make_face()
    extrude(amount=7)
    with BuildSketch(Plane(origin=(-36.553123822, 7, -52.463026398), x_dir=(0.707106781186552, 0, 0.7071067811865429), z_dir=(0, -1, 0)), Plane(origin=(-52.463026398, 7, 36.553123822), x_dir=(0.7071067811865515, 0, -0.7071067811865436), z_dir=(0, -1, 0)), Plane(origin=(36.553123822, 7, 52.463026398), x_dir=(-0.7071067811865527, 0, -0.7071067811865425), z_dir=(0, -1, 0))) as fillet1_piece_11:
        with BuildLine():
            CenterArc((6.286852353, -5), FILLET1_R, 90, 106.003594066)
            ThreePointArc((1.480630334, -6.378488268), (0.658610883, -3.208210045), (0, 0))
            Line((0, 0), (6.286852353, 0))
        make_face()
    extrude(amount=7)
    with BuildSketch(Plane(origin=(-13.5, 7, -34.504008477), x_dir=(-0.9154220062230544, 0, 0.4024954043496127), z_dir=(0, -1, 0)), Plane(origin=(-34.504008477, 7, 13.5), x_dir=(0.4024954043496181, 0, 0.915422006223052), z_dir=(0, -1, 0)), Plane(origin=(13.5, 7, 34.504008477), x_dir=(0.915422006223051, 0, -0.40249540434962), z_dir=(0, -1, 0))) as fillet1_piece_12:
        with BuildLine():
            CenterArc((3.265421252, 4.995737851), FILLET1_R, 203.734271223, 63.899821013)
            Line((-1.311688779, 2.983260829), (0, 0))
            ThreePointArc((0, 0), (1.52950776, 0.031583378), (3.059015519, 0))
        make_face()
    extrude(amount=7)
    with BuildSketch(Plane(origin=(-17.007161012, 7, 32.917063589), x_dir=(-0.7071067811865496, 0, 0.7071067811865455), z_dir=(0, -1, 0))) as fillet1_piece_13:
        with BuildLine():
            CenterArc((3.482570273, -5), FILLET1_R, 90, 67.267112024)
            ThreePointArc((-1.129011858, -3.067822406), (-0.530655558, -1.546368727), (0, 0))
            Line((0, 0), (3.482570273, 0))
        make_face()
    extrude(amount=7)


solid = part.part
